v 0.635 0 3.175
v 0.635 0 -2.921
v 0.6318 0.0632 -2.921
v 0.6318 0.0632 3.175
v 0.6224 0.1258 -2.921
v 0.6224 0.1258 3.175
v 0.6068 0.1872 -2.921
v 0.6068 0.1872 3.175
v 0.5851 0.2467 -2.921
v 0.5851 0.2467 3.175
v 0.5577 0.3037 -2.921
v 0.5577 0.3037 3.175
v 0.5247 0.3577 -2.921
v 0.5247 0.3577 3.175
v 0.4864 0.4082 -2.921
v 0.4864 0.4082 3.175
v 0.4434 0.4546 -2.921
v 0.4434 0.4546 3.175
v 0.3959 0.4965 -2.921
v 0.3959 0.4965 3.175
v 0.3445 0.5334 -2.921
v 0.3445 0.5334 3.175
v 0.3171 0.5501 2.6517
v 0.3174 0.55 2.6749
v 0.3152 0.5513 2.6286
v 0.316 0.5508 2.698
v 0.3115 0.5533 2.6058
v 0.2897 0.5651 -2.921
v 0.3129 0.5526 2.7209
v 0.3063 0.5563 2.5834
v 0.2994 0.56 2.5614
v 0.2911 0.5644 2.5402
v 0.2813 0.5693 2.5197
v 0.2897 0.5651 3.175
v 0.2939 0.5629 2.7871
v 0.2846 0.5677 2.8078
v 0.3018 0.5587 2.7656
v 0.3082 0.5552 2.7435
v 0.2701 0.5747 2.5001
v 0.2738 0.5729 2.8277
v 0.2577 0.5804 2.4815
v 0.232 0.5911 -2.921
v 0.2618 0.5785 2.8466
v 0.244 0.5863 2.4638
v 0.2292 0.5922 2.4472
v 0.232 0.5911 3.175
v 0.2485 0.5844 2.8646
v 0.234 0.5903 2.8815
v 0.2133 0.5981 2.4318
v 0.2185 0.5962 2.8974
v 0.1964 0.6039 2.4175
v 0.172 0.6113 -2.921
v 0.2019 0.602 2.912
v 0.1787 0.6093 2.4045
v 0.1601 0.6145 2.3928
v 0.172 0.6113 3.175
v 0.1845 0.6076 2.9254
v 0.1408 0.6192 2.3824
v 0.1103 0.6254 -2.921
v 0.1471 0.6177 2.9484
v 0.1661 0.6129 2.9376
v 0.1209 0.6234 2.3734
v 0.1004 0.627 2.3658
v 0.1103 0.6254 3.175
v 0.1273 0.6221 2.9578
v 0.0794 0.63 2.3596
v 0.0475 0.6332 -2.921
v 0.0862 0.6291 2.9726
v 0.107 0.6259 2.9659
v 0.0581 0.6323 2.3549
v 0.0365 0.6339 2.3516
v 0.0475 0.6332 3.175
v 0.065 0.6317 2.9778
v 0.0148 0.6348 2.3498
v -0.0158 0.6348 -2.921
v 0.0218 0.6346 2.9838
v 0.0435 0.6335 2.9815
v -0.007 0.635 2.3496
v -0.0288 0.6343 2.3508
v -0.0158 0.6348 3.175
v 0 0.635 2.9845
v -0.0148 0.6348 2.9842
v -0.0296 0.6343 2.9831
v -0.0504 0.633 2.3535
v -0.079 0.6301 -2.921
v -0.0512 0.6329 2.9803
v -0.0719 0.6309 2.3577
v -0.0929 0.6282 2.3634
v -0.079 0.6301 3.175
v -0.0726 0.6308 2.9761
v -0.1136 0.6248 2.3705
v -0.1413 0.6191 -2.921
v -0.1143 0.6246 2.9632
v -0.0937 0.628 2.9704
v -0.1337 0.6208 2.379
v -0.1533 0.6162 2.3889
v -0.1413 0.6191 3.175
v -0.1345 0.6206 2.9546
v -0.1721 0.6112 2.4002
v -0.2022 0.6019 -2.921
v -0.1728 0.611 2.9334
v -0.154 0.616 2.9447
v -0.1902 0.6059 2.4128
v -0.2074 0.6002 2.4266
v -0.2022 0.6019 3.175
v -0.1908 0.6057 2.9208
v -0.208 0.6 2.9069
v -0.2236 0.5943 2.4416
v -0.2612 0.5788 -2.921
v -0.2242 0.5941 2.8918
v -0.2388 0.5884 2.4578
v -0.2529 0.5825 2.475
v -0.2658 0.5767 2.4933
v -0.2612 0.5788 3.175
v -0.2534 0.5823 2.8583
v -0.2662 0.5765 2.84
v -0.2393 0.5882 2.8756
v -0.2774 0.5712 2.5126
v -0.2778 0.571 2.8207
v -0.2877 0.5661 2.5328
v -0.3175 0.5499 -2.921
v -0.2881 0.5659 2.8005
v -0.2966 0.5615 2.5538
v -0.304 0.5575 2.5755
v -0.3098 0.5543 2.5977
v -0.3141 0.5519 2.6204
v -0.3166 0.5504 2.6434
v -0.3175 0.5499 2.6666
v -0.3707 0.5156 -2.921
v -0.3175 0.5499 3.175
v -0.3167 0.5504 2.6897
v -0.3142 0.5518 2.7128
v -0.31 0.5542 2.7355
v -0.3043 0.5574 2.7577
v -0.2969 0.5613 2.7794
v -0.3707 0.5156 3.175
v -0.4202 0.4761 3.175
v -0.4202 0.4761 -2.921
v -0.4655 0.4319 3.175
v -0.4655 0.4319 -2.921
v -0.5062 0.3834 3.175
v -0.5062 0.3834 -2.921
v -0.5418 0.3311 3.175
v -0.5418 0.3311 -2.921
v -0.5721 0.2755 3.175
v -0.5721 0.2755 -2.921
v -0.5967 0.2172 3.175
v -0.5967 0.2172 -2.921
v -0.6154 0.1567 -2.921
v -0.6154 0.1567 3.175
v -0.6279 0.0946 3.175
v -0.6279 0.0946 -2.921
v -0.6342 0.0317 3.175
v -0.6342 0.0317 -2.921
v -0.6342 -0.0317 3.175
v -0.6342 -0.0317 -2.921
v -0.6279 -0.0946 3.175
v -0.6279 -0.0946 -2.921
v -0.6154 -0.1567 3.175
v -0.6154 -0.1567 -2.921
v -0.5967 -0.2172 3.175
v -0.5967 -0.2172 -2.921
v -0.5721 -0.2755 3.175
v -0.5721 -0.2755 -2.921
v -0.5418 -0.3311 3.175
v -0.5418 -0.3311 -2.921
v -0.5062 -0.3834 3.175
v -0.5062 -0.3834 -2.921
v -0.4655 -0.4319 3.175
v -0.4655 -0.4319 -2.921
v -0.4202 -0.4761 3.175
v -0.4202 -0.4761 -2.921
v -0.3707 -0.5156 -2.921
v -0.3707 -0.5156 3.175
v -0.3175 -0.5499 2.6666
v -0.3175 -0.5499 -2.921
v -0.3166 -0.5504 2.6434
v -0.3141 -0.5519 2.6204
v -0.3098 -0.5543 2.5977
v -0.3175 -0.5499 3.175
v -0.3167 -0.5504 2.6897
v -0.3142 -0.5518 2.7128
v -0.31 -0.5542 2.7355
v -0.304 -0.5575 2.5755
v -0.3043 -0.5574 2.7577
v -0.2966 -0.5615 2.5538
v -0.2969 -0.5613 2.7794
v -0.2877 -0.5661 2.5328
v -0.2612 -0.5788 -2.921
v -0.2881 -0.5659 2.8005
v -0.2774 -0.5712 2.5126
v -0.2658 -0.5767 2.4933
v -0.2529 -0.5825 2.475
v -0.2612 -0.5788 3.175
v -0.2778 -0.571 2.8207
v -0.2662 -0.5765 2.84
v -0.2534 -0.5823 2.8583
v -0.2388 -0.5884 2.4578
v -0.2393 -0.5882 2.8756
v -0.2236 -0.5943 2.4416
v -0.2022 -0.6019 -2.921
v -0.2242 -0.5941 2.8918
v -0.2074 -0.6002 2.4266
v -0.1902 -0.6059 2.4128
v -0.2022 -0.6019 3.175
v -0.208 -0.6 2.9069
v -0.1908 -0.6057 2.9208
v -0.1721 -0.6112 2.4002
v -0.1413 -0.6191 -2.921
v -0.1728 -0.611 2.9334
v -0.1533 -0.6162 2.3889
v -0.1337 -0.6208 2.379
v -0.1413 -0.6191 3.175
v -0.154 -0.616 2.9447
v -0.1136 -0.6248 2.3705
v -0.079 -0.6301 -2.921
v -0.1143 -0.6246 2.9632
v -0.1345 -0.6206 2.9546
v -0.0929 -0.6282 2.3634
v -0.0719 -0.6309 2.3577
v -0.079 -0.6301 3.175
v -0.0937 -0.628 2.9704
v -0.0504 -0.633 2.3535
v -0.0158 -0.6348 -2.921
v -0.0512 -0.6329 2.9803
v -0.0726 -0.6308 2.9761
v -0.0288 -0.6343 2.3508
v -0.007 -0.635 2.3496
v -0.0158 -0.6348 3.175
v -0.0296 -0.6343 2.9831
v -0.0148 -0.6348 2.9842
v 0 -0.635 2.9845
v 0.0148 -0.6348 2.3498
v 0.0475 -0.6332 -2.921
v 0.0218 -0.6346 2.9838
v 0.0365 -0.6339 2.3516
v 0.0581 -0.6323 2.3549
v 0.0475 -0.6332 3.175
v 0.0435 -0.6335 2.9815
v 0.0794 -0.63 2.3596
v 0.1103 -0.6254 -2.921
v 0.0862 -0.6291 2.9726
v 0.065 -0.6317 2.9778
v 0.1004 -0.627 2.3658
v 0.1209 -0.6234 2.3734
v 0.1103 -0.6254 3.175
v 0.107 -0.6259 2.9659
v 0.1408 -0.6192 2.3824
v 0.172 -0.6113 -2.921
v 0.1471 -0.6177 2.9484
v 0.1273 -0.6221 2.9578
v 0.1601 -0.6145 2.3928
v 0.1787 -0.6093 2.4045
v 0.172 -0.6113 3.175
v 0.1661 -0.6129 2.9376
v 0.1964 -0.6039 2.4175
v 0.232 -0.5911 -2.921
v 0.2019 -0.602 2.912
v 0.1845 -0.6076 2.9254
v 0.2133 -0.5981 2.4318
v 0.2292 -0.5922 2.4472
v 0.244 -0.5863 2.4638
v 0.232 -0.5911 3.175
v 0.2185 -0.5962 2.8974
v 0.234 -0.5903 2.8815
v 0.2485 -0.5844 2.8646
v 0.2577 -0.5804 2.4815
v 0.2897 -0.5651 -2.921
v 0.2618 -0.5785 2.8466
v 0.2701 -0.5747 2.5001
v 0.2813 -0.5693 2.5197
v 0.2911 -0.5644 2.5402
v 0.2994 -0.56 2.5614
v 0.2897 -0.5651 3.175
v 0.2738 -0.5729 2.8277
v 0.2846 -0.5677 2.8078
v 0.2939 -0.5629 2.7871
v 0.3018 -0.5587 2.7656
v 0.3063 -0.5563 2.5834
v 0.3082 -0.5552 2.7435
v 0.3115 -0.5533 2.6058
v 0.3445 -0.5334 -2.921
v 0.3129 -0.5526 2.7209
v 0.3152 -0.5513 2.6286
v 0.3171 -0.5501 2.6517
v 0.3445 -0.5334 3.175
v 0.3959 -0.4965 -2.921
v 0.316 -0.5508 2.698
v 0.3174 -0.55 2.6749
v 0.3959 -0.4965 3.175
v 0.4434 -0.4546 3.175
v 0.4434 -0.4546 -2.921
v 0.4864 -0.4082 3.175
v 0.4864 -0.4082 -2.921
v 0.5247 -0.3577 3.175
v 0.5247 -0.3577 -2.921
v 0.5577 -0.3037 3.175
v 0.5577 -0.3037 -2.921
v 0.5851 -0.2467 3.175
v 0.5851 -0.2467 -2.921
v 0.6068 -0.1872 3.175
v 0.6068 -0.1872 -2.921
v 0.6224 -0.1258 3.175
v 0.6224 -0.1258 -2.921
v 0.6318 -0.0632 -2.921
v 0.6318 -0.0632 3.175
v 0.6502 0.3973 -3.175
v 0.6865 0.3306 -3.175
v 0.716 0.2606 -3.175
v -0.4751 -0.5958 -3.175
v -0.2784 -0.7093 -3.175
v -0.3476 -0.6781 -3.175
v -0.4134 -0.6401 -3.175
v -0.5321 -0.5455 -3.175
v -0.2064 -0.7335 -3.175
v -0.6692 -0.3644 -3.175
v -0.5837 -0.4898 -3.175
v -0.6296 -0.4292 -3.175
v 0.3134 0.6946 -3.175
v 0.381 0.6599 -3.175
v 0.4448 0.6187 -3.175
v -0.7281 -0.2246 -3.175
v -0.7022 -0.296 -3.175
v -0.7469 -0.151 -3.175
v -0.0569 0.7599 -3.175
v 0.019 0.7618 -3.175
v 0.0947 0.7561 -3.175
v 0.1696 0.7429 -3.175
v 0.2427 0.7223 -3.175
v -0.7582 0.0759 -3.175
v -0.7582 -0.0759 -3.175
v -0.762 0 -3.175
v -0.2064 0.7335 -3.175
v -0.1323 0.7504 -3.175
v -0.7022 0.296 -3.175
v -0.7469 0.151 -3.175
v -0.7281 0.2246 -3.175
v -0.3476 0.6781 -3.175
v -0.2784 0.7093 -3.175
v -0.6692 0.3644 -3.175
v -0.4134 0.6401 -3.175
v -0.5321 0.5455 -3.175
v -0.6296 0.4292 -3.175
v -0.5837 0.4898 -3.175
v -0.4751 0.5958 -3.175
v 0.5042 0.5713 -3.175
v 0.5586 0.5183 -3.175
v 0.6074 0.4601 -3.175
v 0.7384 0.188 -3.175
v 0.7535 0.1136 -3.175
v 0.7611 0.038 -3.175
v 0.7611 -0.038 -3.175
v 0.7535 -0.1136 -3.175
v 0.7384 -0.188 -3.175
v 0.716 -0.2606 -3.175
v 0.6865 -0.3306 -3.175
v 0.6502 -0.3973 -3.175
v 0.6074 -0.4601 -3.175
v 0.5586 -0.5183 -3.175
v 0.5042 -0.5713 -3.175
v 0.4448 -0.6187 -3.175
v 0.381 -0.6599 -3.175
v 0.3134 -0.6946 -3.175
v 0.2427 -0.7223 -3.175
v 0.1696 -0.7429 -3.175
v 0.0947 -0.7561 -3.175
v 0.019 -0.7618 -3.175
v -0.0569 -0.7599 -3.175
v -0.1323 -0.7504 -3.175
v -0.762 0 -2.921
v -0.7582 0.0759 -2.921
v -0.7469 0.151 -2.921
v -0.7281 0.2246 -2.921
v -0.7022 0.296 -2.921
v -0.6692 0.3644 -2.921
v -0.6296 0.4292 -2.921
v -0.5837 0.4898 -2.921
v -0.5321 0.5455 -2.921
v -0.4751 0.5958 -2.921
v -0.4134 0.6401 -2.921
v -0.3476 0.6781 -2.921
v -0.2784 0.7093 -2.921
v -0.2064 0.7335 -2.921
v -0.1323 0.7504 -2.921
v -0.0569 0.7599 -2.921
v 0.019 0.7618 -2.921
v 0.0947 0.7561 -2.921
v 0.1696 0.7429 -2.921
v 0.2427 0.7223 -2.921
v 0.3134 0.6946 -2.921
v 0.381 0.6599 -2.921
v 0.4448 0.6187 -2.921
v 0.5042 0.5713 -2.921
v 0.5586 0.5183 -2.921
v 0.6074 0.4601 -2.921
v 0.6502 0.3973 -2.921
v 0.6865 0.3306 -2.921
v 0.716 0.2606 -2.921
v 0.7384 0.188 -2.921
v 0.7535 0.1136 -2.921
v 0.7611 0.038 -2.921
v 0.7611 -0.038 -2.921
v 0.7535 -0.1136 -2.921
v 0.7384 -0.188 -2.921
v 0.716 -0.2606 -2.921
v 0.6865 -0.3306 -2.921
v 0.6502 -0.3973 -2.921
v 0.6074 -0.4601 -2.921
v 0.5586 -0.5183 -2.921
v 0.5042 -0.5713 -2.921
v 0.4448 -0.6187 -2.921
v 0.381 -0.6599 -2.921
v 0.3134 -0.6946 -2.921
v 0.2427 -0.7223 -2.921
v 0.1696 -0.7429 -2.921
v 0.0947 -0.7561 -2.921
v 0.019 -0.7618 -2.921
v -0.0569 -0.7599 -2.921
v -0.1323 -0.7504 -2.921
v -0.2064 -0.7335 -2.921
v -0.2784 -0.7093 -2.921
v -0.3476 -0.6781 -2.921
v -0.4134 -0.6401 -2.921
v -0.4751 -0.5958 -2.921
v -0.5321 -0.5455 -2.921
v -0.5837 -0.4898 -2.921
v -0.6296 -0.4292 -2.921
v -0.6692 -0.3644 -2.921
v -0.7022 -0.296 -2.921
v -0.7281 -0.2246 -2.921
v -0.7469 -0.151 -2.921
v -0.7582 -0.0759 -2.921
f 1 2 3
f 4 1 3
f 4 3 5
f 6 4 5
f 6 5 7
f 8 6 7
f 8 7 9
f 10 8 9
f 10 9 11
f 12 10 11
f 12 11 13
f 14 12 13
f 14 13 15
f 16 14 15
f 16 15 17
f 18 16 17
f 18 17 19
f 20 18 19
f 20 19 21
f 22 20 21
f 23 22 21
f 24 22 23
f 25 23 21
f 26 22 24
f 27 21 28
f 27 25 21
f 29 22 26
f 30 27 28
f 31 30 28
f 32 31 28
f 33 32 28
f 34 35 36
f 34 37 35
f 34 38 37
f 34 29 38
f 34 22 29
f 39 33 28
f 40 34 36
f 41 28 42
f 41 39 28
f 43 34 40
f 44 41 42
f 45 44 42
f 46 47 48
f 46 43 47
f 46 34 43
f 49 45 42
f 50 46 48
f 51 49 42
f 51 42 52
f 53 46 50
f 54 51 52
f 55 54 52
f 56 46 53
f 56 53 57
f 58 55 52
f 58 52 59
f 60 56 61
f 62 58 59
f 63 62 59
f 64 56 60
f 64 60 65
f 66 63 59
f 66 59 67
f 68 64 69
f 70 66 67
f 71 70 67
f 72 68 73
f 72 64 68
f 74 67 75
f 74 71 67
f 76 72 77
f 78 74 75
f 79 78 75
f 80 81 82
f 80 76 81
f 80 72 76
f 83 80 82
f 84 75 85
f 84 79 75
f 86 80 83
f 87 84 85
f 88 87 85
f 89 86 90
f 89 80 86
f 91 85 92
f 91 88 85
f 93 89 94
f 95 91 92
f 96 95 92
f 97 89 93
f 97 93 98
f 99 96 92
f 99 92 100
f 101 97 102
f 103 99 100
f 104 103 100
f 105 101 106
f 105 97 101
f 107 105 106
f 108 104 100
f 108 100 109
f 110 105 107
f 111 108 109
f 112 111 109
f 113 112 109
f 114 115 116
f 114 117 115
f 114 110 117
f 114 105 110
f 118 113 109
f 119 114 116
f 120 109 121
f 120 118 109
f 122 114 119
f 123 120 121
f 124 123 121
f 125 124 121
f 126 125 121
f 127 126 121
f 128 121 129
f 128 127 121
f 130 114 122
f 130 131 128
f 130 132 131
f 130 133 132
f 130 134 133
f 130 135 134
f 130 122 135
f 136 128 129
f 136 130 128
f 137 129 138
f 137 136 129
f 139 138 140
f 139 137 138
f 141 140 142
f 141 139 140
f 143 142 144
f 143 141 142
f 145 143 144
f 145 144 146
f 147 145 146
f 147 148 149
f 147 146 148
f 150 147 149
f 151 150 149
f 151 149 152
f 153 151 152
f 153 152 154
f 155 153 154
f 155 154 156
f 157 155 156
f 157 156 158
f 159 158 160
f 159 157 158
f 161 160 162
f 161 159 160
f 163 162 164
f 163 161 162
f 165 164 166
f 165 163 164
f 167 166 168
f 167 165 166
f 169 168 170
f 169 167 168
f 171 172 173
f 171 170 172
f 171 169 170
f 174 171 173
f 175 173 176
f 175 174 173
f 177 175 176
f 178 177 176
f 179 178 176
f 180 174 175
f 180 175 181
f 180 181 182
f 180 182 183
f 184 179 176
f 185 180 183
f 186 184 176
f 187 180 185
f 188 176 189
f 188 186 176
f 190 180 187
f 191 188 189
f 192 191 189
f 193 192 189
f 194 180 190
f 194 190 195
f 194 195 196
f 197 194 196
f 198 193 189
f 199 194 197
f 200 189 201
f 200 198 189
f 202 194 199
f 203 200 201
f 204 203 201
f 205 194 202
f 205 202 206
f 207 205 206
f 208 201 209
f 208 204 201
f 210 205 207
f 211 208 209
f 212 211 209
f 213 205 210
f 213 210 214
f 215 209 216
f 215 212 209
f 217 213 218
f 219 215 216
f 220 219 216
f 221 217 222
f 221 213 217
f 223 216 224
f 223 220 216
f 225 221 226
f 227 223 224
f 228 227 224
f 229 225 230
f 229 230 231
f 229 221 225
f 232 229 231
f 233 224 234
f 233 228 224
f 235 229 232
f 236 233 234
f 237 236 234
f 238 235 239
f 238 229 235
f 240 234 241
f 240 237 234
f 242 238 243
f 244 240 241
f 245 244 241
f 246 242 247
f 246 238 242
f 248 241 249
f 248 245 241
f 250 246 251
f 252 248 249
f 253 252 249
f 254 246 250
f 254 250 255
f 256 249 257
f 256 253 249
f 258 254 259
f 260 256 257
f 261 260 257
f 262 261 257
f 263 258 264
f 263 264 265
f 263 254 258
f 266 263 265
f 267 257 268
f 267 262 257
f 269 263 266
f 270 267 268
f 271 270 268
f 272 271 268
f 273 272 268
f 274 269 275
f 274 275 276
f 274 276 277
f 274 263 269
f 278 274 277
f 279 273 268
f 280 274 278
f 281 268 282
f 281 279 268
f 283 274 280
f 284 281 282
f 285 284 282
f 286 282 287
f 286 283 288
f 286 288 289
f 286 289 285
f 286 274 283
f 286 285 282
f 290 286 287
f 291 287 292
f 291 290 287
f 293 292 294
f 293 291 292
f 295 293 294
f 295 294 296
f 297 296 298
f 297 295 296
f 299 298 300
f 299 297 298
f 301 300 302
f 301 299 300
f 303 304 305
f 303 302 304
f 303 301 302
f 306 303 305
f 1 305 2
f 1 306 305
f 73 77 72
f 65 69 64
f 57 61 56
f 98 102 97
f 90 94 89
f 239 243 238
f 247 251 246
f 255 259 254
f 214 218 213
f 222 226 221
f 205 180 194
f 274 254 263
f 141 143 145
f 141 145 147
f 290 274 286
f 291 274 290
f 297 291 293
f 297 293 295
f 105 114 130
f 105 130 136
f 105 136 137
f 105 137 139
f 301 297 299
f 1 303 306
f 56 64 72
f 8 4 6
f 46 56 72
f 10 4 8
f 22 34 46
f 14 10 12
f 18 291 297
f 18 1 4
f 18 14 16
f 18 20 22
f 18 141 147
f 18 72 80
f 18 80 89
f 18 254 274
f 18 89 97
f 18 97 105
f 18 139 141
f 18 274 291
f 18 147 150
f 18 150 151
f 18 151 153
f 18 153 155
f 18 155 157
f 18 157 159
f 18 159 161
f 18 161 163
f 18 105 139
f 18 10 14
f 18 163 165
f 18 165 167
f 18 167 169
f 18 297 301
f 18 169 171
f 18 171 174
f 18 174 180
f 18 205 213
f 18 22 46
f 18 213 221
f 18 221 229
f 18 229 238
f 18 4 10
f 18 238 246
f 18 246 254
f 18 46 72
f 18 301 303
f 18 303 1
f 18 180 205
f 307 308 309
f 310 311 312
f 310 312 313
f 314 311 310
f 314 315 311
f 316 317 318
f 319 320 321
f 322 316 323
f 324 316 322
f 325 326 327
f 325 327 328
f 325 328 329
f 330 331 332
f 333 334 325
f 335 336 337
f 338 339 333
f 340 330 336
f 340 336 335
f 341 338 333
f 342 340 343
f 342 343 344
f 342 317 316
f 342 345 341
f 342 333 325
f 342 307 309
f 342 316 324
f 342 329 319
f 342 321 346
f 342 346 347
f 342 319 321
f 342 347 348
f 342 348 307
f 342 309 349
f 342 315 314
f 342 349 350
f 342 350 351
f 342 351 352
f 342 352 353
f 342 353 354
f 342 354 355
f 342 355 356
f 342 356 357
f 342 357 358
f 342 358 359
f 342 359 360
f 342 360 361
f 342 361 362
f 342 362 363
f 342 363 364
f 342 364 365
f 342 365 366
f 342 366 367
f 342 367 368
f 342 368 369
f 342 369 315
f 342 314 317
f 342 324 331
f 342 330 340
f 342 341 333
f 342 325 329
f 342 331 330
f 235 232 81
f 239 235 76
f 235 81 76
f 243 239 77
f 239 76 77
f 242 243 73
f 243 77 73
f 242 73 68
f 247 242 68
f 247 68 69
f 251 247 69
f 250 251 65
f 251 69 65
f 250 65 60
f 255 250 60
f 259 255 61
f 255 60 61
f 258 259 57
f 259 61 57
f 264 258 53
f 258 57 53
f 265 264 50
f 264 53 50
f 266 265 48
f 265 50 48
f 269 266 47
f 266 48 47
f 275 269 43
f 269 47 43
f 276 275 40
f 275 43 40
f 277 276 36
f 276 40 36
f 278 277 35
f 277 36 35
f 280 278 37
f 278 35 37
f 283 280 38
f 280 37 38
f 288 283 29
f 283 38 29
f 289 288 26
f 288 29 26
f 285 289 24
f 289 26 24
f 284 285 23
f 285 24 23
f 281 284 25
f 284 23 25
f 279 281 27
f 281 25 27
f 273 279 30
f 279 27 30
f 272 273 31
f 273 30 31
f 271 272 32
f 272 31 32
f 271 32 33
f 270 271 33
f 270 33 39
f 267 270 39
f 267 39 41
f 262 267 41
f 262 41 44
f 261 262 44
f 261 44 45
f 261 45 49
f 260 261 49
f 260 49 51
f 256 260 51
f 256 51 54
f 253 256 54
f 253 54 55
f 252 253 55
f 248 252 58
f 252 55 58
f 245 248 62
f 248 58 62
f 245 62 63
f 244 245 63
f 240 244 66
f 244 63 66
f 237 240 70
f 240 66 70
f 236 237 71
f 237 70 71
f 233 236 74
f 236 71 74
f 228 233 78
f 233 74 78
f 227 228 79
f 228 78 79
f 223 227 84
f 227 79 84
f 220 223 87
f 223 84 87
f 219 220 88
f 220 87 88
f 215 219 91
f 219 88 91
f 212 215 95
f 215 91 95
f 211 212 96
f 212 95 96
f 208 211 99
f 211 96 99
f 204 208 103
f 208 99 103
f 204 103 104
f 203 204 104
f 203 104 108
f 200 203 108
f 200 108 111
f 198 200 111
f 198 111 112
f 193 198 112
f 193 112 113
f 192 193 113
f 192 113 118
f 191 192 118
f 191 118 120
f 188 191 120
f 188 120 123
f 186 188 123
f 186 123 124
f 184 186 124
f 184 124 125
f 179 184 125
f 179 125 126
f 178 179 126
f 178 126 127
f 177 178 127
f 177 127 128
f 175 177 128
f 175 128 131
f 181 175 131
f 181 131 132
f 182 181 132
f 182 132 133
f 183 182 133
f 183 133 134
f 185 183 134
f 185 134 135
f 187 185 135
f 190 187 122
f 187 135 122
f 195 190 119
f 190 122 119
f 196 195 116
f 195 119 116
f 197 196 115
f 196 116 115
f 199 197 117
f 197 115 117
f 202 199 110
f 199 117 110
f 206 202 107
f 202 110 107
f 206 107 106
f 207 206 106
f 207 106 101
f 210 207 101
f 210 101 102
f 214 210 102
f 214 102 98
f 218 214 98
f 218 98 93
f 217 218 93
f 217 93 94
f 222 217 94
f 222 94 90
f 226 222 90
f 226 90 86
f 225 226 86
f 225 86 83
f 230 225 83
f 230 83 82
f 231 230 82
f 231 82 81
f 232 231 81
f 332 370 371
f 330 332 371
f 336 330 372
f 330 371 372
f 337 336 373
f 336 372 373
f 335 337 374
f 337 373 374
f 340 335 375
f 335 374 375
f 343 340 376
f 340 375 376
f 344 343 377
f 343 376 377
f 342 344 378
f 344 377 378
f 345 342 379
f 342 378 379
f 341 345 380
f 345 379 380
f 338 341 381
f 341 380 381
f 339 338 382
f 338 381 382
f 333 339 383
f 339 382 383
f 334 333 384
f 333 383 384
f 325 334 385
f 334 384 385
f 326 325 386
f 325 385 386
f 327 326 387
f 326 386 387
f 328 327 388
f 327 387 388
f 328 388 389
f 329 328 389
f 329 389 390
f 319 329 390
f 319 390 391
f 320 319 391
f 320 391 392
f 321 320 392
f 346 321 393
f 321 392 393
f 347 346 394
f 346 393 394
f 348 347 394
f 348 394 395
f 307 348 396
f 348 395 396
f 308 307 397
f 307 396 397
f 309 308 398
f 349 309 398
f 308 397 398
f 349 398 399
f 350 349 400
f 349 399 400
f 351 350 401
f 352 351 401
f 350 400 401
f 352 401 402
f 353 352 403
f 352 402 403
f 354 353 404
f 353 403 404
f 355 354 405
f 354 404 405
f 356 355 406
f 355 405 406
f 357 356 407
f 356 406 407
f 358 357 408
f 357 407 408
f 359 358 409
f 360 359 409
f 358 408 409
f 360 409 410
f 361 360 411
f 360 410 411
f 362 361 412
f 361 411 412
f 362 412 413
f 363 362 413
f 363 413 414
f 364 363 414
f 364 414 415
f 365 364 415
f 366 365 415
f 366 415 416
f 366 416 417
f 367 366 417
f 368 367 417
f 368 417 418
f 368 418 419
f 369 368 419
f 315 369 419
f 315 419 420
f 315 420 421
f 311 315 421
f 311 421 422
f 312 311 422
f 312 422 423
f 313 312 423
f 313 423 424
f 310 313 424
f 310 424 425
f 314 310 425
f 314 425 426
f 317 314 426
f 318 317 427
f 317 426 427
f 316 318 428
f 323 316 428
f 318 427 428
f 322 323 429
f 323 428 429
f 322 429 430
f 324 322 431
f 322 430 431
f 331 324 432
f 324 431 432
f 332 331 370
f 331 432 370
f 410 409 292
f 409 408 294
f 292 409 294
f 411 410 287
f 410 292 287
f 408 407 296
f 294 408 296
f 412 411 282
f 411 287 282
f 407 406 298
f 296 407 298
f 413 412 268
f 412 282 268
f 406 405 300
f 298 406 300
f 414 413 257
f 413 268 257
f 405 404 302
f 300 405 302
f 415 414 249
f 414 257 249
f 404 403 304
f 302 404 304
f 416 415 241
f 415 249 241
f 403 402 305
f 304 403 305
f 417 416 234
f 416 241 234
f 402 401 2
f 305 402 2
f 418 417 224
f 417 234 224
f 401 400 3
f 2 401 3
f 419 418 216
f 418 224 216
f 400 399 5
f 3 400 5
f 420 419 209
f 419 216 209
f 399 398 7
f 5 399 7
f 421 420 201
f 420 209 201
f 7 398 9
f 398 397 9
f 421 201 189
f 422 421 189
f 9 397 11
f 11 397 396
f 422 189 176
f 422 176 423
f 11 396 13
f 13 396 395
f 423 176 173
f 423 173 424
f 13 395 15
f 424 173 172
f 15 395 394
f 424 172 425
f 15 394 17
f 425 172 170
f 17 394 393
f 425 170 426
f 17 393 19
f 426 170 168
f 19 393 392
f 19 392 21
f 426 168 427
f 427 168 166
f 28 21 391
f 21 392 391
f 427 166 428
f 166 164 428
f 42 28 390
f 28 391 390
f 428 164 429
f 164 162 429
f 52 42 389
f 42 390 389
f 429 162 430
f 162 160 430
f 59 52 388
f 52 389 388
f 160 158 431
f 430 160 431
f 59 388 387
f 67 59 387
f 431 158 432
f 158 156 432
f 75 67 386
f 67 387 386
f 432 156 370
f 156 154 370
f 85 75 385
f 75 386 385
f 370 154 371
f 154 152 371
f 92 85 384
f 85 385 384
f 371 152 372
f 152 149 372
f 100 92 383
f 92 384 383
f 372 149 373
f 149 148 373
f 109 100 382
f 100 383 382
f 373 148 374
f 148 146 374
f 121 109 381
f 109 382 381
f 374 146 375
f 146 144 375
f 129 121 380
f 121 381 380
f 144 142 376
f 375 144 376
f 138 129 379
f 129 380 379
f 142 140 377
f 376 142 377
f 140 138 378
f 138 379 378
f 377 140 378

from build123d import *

# Parameters (mm, degrees)
SKETCH3_R           = 0.635
BOSS_EXTRUDE1_DEPTH = 3.175
SKETCH4_R           = 0.3175
CUT_EXTRUDE1_DEPTH  = 1.524
BOSS_EXTRUDE2_START = -0.254
SKETCH5_R           = 0.762
SKETCH5_R_2         = 0.635
BOSS_EXTRUDE2_DEPTH = 0.254


with BuildPart() as part:
    # Sketch3 → Boss-Extrude1 (new, symmetric)
    with BuildSketch(Plane.XY):
        Circle(SKETCH3_R)
    extrude(amount=BOSS_EXTRUDE1_DEPTH, both=True)

    # Sketch4 → Cut-Extrude1 (cut, symmetric)
    with BuildSketch(Plane(origin=(0, 0, 0), x_dir=(1, 0, 0), z_dir=(0, 1, 0))):
        with Locations(Location((0, -2.667, 0), (0, 0, 270))):
            Circle(SKETCH4_R)
    extrude(amount=CUT_EXTRUDE1_DEPTH, both=True, mode=Mode.SUBTRACT)

    # Sketch5 → Boss-Extrude2 (add)
    with BuildSketch(Plane(origin=(0, 0, -3.175), x_dir=(-1, 0, 0), z_dir=(0, 0, -1)).offset(BOSS_EXTRUDE2_START)):
        Circle(SKETCH5_R)
        Circle(SKETCH5_R_2, mode=Mode.SUBTRACT)
    extrude(amount=BOSS_EXTRUDE2_DEPTH)


solid = part.part
